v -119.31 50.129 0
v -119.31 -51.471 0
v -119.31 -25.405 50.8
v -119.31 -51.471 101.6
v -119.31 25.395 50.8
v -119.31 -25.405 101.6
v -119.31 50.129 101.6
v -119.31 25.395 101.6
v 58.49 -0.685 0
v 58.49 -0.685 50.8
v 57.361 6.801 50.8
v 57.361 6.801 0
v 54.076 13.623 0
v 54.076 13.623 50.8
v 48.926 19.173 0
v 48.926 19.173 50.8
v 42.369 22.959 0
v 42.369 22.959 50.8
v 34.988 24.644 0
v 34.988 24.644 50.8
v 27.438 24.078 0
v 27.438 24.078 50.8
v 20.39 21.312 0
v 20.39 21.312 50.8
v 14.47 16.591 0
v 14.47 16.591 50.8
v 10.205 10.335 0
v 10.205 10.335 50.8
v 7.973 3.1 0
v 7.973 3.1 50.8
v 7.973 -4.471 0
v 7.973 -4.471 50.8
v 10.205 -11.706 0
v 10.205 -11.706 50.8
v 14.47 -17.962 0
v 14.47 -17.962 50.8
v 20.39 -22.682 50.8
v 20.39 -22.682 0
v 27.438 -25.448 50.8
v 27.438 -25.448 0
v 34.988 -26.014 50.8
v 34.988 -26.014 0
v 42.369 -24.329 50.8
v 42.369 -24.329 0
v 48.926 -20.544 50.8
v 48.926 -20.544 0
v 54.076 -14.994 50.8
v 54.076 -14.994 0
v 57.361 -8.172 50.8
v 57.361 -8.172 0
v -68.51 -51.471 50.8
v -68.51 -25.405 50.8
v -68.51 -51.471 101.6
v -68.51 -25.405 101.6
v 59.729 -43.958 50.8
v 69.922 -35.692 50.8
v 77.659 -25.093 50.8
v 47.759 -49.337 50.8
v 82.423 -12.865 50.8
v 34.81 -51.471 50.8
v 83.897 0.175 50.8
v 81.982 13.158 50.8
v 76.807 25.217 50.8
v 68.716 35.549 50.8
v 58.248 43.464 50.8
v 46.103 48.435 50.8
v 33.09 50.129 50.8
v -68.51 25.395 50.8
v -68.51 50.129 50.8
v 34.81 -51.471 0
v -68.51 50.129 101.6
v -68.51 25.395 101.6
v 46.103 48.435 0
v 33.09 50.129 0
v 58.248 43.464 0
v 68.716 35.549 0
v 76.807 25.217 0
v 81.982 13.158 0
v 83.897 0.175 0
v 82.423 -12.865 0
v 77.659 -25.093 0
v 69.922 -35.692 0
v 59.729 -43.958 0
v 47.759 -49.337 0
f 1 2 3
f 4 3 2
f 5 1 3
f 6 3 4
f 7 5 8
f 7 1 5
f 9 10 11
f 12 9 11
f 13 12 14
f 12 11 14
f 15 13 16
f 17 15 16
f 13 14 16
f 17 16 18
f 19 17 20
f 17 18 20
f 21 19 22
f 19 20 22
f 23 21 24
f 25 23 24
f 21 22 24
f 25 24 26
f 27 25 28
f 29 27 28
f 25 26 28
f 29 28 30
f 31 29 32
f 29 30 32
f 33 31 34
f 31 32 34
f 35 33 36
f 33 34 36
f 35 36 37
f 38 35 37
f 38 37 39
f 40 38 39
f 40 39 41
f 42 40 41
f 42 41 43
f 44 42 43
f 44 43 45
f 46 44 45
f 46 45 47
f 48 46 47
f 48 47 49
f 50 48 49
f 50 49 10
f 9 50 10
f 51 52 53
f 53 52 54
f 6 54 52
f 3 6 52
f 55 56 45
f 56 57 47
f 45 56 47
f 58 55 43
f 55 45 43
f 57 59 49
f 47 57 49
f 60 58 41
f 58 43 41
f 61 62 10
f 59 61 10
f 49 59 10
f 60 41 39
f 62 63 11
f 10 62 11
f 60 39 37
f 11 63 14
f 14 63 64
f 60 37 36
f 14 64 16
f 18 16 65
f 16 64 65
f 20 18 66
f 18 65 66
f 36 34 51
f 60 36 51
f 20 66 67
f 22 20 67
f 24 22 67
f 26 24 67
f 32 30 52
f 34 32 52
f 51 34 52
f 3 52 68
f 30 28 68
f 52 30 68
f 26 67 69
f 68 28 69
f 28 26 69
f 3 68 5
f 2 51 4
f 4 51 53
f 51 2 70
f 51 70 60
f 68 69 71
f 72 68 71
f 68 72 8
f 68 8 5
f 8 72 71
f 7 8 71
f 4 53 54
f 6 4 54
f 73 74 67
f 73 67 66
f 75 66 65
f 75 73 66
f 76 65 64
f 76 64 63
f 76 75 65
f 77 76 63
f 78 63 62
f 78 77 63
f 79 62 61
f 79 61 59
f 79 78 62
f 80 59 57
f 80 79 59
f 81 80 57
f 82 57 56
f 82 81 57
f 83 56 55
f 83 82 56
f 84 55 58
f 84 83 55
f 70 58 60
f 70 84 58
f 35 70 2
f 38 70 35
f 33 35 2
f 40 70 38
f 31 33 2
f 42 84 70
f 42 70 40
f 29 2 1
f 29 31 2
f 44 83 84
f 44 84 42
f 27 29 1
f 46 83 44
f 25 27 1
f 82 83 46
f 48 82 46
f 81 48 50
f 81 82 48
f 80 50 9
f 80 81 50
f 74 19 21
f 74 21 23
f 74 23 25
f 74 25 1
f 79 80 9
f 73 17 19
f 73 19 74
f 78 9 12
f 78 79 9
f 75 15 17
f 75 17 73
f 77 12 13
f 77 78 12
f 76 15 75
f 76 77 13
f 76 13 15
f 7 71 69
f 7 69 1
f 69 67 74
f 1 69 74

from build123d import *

# Parameters (mm, degrees)
EXTRUDE1_DEPTH     = 50.8
SKETCH3_W          = 50.8
SKETCH3_H          = 101.6
EXTRUDE2_DEPTH     = 50.8
SKETCH5_W          = 50.8
SKETCH5_H          = 50.8
CUT_EXTRUDE1_DEPTH = 50.8
SKETCH6_R          = 25.4
CUT_EXTRUDE2_DEPTH = 51.8


with BuildPart() as part:
    # Sketch2 → Extrude1 (new body)
    with BuildSketch(Plane.XY):
        with BuildLine():
            Line((-68.510209021, 50.129277125), (33.089790979, 50.129277125))
            ThreePointArc((33.089790979, 50.129277125), (83.897074784, 0.175115288), (34.810357915, -51.470722875))
            Line((34.810357915, -51.470722875), (-68.510209021, -51.470722875))
            Line((-68.510209021, -51.470722875), (-68.510209021, 50.129277125))
        make_face()
    extrude(amount=EXTRUDE1_DEPTH)

    # Sketch3 → Extrude2 (add)
    with BuildSketch(Plane.ZY.offset(68.510209021)):
        with Locations((76.2, -0.670722875)):
            Rectangle(SKETCH3_W, SKETCH3_H)
        with Locations((25.4, -0.670722875)):
            Rectangle(SKETCH3_W, SKETCH3_H)
    extrude(amount=EXTRUDE2_DEPTH)

    # Sketch5 → Cut-Extrude1 (cut)
    with BuildSketch(Plane(origin=(-68.510209021, 0, 0), x_dir=(0, 0, -1), z_dir=(1, 0, 0))):
        with Locations((-76.2, -0.005051238)):
            Rectangle(SKETCH5_W, SKETCH5_H)
    extrude(amount=-CUT_EXTRUDE1_DEPTH, mode=Mode.SUBTRACT)

    # Sketch6 → Cut-Extrude2 (cut, through all)
    with BuildSketch(Plane.XY.offset(50.8)):
        with Locations((33.089790979, -0.685291529)):
            Circle(SKETCH6_R)
    extrude(amount=-CUT_EXTRUDE2_DEPTH, mode=Mode.SUBTRACT)


solid = part.part
